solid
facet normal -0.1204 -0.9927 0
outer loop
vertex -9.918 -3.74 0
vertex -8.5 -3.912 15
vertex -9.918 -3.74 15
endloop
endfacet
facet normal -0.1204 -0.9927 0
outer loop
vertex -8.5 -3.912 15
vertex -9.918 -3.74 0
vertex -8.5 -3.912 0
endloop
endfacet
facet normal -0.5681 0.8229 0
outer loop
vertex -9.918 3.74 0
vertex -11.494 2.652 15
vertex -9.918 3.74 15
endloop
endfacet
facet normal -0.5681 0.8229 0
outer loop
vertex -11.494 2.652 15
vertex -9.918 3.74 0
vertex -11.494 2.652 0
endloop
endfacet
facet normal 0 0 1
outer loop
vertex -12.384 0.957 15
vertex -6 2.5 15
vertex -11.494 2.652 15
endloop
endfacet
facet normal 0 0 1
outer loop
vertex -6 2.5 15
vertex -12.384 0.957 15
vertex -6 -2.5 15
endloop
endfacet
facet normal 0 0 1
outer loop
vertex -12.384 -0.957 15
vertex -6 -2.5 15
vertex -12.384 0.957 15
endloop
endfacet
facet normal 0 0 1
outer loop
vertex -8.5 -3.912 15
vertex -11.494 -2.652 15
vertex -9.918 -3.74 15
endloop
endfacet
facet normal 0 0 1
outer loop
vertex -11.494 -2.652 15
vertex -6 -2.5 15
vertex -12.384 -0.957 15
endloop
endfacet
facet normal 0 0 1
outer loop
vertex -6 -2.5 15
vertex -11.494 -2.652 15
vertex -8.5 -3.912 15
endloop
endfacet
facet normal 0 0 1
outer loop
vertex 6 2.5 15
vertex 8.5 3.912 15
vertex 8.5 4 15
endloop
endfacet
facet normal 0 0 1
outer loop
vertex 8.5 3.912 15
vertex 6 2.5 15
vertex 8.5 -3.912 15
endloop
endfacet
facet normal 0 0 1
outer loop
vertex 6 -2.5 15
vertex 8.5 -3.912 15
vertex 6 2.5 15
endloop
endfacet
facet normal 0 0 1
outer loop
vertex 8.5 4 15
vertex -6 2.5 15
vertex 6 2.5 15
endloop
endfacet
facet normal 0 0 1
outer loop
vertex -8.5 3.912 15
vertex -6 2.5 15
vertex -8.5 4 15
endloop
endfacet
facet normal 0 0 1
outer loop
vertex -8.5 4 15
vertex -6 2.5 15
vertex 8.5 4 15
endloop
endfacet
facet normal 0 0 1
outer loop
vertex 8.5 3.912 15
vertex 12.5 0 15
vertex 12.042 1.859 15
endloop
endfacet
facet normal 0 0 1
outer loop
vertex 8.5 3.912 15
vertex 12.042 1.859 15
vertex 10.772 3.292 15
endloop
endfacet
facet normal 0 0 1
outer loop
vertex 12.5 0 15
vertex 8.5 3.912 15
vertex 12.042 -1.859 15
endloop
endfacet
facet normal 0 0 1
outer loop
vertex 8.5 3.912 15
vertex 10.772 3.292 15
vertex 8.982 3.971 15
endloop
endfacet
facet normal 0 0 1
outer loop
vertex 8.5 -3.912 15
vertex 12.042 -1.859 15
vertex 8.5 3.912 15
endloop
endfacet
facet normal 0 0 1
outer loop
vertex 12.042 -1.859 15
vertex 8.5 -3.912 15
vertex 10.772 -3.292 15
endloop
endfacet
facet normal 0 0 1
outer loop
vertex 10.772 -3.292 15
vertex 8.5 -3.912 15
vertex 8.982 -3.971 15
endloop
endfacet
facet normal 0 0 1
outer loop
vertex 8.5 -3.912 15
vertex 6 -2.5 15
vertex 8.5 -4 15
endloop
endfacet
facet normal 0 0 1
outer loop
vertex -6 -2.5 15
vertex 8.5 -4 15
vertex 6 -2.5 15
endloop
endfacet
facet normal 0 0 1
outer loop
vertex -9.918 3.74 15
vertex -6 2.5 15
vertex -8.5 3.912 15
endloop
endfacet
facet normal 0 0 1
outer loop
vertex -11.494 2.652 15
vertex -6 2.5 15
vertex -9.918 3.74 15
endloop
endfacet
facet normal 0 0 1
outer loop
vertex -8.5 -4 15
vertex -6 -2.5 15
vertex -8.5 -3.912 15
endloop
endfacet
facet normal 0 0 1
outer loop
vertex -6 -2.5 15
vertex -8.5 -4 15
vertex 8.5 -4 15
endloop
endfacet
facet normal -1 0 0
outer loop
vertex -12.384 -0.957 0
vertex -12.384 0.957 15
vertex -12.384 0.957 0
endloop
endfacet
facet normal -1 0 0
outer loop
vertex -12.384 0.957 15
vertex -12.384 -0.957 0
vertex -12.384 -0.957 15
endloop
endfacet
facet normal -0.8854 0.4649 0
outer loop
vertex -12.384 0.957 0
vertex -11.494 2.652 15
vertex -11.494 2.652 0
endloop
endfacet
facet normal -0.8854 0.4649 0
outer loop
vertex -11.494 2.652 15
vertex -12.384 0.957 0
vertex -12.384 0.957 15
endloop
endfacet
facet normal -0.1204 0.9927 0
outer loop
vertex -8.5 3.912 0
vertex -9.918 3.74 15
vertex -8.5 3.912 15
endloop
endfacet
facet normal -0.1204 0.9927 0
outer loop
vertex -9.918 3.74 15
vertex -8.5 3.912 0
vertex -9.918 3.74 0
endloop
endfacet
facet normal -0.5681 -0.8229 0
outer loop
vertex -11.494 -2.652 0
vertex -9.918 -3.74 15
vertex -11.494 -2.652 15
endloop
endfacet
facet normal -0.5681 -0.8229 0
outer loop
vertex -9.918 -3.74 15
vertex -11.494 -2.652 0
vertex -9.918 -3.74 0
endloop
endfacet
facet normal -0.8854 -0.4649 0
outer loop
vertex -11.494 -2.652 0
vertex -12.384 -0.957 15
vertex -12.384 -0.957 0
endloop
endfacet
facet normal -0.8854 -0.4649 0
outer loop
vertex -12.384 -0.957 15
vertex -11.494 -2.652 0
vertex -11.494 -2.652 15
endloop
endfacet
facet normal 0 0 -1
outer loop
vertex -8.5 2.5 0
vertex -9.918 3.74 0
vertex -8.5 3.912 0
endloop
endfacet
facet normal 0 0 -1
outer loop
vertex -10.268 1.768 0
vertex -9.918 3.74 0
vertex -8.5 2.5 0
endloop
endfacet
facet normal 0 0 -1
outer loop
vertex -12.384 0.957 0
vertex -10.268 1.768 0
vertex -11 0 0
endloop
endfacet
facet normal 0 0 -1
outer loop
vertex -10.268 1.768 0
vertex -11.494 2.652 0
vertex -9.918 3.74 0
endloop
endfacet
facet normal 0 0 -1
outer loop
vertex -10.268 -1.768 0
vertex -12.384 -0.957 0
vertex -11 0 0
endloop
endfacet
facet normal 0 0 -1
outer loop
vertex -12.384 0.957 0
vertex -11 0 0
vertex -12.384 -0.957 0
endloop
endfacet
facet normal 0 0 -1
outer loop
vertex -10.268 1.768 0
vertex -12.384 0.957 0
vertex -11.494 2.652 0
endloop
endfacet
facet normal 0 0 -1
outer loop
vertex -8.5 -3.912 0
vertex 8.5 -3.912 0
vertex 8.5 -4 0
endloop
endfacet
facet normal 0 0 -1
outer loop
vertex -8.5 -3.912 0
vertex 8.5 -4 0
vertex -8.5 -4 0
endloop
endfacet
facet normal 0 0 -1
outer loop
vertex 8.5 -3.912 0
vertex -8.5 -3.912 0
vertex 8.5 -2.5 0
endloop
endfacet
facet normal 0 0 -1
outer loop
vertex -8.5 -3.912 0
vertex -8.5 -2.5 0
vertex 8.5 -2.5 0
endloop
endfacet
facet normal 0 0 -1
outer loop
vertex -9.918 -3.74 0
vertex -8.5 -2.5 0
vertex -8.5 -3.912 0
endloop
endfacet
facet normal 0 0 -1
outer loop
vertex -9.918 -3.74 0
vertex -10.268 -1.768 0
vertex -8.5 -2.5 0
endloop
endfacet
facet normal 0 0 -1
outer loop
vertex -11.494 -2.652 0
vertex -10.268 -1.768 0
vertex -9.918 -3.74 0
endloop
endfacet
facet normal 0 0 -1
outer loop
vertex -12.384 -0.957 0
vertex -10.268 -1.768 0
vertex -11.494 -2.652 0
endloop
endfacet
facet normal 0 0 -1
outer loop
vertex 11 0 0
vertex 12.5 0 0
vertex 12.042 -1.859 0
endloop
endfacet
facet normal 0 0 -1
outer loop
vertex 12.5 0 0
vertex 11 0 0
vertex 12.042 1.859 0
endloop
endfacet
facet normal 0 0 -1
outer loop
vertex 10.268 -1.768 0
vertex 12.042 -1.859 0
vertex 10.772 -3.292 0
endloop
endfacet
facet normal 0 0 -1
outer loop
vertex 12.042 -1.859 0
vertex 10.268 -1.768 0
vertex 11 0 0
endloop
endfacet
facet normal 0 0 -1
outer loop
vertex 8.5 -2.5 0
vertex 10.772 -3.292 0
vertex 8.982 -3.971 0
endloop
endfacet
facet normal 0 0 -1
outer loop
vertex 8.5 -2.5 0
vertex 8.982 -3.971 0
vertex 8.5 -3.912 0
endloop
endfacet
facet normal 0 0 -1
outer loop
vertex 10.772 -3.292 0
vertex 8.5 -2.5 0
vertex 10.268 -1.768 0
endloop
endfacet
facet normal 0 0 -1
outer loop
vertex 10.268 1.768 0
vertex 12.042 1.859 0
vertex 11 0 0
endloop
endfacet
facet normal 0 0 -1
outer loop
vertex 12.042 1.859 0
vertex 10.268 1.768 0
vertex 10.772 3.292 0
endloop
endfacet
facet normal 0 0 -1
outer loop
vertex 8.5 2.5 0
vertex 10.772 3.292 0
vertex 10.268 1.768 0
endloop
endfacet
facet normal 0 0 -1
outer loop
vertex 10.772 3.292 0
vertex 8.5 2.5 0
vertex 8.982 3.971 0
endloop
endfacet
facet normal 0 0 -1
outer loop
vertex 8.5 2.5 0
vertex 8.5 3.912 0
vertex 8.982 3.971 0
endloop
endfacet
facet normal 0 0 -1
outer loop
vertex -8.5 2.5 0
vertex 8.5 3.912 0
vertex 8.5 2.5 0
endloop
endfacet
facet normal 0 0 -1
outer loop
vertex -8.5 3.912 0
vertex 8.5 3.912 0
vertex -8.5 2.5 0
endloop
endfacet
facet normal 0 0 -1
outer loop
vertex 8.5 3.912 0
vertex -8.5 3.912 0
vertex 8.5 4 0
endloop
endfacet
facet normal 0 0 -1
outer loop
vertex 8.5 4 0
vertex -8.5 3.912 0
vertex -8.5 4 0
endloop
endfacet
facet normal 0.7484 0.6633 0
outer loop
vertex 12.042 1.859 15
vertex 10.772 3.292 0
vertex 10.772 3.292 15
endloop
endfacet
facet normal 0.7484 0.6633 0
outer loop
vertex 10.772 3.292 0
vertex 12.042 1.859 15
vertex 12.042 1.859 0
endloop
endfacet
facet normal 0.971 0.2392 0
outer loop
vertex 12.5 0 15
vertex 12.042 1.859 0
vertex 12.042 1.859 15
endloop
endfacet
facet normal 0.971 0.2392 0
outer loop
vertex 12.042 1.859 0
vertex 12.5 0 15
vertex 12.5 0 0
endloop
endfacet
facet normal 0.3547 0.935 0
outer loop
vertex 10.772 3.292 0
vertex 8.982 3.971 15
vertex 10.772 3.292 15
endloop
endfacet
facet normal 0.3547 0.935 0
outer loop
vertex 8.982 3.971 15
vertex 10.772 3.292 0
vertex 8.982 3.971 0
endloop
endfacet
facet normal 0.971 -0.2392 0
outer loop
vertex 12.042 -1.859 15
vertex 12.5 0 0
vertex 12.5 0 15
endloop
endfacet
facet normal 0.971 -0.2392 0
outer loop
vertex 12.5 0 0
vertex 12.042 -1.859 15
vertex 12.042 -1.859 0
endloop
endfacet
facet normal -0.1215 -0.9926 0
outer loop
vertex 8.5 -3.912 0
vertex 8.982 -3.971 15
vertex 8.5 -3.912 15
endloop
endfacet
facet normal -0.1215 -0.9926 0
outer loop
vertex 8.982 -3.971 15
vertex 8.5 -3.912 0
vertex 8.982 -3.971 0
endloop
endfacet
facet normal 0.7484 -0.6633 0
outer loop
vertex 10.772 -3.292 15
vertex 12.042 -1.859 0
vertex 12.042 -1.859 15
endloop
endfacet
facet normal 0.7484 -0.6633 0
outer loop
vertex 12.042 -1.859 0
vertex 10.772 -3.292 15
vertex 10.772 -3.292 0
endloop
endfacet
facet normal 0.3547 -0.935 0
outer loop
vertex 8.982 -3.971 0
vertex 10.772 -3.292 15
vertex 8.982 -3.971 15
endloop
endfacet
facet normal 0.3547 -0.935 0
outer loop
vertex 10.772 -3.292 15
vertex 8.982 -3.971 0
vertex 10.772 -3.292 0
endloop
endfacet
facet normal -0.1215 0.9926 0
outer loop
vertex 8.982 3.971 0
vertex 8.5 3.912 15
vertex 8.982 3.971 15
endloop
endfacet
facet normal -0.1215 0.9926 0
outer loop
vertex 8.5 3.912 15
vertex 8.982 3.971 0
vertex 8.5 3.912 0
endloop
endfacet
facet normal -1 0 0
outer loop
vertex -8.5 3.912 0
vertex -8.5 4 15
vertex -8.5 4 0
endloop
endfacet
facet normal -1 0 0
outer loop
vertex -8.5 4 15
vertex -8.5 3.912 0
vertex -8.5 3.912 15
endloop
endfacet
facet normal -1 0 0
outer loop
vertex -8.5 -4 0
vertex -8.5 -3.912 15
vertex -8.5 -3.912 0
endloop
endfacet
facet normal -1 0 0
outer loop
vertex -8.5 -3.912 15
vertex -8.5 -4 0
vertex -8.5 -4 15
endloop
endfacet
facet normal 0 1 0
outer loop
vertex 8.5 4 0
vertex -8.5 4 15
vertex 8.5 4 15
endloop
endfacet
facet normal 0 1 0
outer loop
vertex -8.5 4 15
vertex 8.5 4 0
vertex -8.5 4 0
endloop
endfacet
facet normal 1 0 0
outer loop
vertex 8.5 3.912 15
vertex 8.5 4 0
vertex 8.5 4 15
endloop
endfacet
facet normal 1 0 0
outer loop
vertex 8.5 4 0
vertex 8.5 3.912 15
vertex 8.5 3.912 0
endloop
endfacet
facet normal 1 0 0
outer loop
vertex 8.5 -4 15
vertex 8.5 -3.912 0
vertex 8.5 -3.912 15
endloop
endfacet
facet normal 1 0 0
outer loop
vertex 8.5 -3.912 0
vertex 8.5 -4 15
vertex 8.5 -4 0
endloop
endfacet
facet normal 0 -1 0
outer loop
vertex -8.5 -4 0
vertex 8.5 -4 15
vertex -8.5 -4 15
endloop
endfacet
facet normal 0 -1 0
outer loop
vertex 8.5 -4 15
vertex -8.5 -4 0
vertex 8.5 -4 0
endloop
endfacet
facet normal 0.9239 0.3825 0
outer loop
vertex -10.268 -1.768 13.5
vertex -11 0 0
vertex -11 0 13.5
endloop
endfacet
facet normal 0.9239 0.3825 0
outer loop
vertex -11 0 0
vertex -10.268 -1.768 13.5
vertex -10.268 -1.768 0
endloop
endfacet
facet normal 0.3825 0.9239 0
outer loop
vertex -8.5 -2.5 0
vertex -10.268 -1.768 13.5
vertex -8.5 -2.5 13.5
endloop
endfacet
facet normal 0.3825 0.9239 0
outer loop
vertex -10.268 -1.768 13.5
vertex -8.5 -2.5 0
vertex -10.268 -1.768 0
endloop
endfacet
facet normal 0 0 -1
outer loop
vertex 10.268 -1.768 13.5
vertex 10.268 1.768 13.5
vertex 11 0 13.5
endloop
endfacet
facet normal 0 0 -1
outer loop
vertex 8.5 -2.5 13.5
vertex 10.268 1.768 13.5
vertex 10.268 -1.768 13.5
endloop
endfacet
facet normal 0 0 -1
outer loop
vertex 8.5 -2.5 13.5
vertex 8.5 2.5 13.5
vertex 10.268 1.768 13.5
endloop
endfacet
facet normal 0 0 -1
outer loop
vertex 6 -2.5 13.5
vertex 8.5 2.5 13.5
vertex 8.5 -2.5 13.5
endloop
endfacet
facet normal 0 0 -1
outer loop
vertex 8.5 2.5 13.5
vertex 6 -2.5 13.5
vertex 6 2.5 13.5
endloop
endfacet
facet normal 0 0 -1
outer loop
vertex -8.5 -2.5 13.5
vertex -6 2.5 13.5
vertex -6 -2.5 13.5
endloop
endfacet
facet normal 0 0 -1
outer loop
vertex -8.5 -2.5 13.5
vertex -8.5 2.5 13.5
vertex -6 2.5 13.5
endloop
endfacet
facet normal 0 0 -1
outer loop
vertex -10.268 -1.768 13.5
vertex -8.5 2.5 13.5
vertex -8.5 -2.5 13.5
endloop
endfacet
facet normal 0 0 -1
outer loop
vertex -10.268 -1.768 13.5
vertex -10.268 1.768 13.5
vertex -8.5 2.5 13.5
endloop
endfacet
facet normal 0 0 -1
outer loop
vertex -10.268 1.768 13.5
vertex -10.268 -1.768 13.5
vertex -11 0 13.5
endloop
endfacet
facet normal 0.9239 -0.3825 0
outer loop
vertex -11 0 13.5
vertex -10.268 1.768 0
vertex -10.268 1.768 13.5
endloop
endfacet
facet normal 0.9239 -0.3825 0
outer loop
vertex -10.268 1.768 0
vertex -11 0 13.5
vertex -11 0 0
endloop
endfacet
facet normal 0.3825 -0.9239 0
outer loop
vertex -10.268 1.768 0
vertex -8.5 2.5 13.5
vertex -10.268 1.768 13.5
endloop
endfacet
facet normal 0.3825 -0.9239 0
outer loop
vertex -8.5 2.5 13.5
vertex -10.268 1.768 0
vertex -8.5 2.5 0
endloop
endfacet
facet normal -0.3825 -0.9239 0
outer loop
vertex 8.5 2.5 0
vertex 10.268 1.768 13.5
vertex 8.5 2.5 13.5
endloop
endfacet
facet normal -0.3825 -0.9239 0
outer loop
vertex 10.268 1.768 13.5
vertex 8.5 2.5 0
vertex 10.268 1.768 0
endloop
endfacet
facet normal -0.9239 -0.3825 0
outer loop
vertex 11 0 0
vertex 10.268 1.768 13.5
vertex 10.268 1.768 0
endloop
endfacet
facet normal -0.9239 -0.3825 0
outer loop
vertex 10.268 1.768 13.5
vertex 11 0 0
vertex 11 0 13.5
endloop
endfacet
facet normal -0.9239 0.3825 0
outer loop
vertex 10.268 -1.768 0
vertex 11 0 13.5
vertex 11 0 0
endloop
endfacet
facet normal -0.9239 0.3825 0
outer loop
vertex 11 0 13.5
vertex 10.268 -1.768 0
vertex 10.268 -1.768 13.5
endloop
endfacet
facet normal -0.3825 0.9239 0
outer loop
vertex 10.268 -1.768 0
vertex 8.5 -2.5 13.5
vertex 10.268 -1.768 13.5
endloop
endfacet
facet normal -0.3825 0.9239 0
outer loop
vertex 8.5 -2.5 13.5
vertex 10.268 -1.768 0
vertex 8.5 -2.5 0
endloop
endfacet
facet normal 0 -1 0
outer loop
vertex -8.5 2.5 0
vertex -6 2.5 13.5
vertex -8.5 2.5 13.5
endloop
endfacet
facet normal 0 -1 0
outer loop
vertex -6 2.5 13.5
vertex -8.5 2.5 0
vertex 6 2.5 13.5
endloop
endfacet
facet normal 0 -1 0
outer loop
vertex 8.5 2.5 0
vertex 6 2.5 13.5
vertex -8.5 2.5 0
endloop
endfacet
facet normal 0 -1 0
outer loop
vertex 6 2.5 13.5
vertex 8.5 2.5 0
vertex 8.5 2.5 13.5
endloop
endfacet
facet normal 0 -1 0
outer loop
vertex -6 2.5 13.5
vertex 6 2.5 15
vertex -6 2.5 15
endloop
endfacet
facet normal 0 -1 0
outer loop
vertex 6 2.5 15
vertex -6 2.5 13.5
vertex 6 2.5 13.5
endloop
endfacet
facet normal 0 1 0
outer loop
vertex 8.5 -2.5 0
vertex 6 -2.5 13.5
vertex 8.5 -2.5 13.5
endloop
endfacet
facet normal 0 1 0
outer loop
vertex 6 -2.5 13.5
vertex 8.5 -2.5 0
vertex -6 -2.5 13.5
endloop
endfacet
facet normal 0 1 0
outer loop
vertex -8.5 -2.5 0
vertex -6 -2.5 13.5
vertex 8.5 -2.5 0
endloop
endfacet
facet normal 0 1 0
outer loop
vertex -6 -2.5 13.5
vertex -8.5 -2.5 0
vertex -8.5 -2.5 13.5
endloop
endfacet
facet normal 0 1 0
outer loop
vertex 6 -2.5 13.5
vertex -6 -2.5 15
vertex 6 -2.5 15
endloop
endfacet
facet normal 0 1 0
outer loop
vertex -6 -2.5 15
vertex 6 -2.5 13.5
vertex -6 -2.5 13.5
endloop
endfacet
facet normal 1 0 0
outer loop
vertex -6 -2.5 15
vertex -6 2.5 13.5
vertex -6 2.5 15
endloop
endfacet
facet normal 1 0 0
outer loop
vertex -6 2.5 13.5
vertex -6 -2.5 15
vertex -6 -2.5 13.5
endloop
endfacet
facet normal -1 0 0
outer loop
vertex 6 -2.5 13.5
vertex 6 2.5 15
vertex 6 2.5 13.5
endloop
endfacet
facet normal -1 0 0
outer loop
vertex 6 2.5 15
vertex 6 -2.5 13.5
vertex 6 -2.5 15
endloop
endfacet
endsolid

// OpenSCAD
outerHeight = 8;
outerWidth = 25;
outerLength = 15;
wall = 1.5;
hdmiWidth = 12;
hdmiHeight = 5;

innerHeight = outerHeight - wall*2;
innerWidth = outerWidth - wall*2;
innerLength = outerLength - wall;

module mainShape(w, h, l) {
    translate([-w/2+h/2, 0, 0])
        cylinder(h=l, r=h/2);
    translate([w/2-h/2, 0, 0])
        cylinder(h=l, r=h/2);
    linear_extrude(l)
        square([w-h, h], true);
}

difference() {
    mainShape(outerWidth, outerHeight, outerLength);
    mainShape(innerWidth, innerHeight, innerLength);
    linear_extrude(50)
        square([hdmiWidth, hdmiHeight], true);
}
